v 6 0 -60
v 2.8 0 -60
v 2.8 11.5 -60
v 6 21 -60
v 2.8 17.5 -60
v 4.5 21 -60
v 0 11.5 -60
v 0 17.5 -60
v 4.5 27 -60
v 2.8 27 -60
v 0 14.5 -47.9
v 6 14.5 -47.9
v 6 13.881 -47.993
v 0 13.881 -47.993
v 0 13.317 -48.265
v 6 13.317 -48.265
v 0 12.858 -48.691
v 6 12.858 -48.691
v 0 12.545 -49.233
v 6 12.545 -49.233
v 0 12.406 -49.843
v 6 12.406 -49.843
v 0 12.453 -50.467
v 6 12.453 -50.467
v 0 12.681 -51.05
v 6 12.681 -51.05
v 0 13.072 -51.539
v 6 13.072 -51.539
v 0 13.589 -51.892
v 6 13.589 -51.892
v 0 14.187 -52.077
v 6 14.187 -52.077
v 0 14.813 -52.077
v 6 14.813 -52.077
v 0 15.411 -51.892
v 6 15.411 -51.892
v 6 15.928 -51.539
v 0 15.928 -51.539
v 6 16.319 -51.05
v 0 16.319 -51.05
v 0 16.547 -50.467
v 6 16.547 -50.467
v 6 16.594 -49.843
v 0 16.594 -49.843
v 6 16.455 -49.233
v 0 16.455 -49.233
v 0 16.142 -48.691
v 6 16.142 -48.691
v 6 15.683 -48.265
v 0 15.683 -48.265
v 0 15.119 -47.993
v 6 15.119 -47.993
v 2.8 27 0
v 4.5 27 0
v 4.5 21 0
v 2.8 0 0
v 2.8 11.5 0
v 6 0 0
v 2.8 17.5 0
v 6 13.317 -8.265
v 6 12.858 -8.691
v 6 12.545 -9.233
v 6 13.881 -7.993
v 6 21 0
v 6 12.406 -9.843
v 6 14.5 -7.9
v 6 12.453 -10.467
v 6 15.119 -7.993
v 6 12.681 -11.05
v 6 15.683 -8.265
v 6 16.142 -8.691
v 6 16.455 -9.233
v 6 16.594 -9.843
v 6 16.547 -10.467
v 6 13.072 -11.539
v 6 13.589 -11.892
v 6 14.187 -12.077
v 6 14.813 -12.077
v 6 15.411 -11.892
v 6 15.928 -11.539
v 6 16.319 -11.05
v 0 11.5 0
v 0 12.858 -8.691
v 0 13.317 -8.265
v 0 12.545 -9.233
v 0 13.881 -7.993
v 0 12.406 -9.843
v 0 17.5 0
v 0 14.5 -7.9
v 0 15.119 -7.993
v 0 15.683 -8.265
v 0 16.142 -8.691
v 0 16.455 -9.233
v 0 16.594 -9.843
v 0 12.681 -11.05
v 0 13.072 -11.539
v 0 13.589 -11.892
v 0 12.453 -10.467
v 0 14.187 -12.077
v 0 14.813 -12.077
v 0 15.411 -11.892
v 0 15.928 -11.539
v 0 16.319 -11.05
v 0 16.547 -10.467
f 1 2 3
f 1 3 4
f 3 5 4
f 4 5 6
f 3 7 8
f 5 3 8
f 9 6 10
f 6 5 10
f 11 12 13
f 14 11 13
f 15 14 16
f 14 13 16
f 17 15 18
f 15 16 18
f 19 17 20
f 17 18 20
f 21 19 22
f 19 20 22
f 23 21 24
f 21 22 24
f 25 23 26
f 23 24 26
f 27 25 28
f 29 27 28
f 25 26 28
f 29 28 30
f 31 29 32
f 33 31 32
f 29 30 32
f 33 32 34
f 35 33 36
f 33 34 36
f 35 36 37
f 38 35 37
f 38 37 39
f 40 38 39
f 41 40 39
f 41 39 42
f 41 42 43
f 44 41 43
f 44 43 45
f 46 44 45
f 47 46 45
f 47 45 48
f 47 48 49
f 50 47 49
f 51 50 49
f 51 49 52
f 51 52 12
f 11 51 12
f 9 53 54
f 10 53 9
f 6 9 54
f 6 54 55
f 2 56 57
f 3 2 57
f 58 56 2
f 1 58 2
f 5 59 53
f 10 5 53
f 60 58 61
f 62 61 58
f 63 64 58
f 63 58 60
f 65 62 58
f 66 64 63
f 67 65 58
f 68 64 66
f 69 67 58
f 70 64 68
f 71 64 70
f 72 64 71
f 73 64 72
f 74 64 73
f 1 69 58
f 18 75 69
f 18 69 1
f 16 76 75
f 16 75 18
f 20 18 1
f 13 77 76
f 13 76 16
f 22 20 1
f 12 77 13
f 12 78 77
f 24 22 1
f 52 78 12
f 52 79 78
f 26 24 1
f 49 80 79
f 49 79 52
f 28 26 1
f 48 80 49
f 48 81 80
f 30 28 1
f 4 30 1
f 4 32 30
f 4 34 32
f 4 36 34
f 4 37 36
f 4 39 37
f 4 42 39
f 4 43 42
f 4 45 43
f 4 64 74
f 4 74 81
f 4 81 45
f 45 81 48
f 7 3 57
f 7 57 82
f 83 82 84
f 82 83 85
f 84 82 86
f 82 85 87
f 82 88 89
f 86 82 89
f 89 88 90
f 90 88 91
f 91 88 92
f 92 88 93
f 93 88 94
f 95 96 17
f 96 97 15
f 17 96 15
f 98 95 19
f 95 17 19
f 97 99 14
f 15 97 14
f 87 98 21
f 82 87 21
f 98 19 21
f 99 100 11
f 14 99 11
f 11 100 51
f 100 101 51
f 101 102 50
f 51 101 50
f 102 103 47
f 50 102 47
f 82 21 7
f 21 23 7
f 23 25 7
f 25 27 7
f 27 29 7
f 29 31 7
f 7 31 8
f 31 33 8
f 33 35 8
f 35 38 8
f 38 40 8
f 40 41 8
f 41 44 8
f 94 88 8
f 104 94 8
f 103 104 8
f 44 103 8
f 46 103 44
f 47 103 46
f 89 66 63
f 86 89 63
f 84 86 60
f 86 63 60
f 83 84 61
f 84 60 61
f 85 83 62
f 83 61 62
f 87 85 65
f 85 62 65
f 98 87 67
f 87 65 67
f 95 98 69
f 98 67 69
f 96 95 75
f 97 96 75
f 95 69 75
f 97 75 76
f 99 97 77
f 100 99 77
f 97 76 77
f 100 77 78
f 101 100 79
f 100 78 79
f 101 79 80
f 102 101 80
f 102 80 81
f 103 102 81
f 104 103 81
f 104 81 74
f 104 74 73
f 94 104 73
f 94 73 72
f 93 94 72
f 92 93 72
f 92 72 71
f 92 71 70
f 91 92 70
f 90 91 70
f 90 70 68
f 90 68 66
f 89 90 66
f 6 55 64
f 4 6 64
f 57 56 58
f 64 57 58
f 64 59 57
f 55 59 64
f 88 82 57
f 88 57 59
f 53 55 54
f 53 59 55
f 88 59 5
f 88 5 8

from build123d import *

# Parameters (mm, degrees)
SKETCH1_W                = 60
SKETCH1_H                = 27
BOSS_EXTRUDE1_DEPTH      = 6
CUT_EXTRUDE19_DEPTH      = 67.068146637
CUT_EXTRUDE19_DEPTH_BACK = 67.068146637
SKETCH9_W                = 2.8
SKETCH9_H                = 11.5
CUT_EXTRUDE20_DEPTH      = 67.068146637
CUT_EXTRUDE21_DEPTH      = 67.068146637
CUT_EXTRUDE21_DEPTH_BACK = 67.068146637
SKETCH10_W               = 2.8
SKETCH10_H               = 9.5
M5_TAPPED_HOLE3_D        = 4.2
M5_TAPPED_HOLE3_DEPTH    = 12.4
M5_TAPPED_HOLE3_TIP      = 1.2618073
M5_TAPPED_HOLE4_D        = 4.2
M5_TAPPED_HOLE4_DEPTH    = 12.4
M5_TAPPED_HOLE4_TIP      = 1.2618073


with BuildPart() as part:
    # Sketch1 → Boss-Extrude1 (new body)
    with BuildSketch(Plane(origin=(0, 0, 0), x_dir=(0, 0, -1), z_dir=(1, 0, 0))):
        with Locations((30, 13.5)):
            Rectangle(SKETCH1_W, SKETCH1_H)
    extrude(amount=BOSS_EXTRUDE1_DEPTH)

    # 3DSketch1 → Cut-Extrude19 (cut, two sides: drawn at the far end of the back side and taken through both)
    with BuildSketch(Plane(origin=(6, 27, 0), x_dir=(-0.24253562503633286, -0.970142500145332, 0), z_dir=(0, 0, -1)).offset(-CUT_EXTRUDE19_DEPTH_BACK)):
        Polygon((0, 0), (0.363803438, 1.45521375), (6.184658438, 0), (5.820855001, -1.45521375), align=None)
    extrude(amount=CUT_EXTRUDE19_DEPTH + CUT_EXTRUDE19_DEPTH_BACK, mode=Mode.SUBTRACT)

    # Sketch9 → Cut-Extrude20 (cut, through all)
    with BuildSketch(Plane(origin=(0, 0, -60), x_dir=(-1, 0, 0), z_dir=(0, 0, -1))):
        with Locations((-1.4, 5.75)):
            Rectangle(SKETCH9_W, SKETCH9_H)
    extrude(amount=-CUT_EXTRUDE20_DEPTH, mode=Mode.SUBTRACT)

    # Sketch10 → Cut-Extrude21 (cut, two sides: drawn at the far end of the back side and taken through both)
    with BuildSketch(Plane(origin=(0, 0, -60), x_dir=(-1, 0, 0), z_dir=(0, 0, -1)).offset(-CUT_EXTRUDE21_DEPTH_BACK)):
        with Locations((-1.4, 22.25)):
            Rectangle(SKETCH10_W, SKETCH10_H)
    extrude(amount=CUT_EXTRUDE21_DEPTH + CUT_EXTRUDE21_DEPTH_BACK, mode=Mode.SUBTRACT)

    # M5 Tapped Hole3
    with Locations(Plane(origin=(0, 14.5, -50), x_dir=(0, 0, -1), z_dir=(-1, 0, 0))):
        with Locations((0, 0)):
            Hole(M5_TAPPED_HOLE3_D / 2, depth=M5_TAPPED_HOLE3_DEPTH)
            with Locations((0, 0, -(M5_TAPPED_HOLE3_DEPTH + M5_TAPPED_HOLE3_TIP / 2))):  # 118° drill point
                Cone(0, M5_TAPPED_HOLE3_D / 2, M5_TAPPED_HOLE3_TIP, mode=Mode.SUBTRACT)

    # M5 Tapped Hole4
    with Locations(Plane(origin=(0, 14.5, -10), x_dir=(0, 0, -1), z_dir=(-1, 0, 0))):
        with Locations((0, 0)):
            Hole(M5_TAPPED_HOLE4_D / 2, depth=M5_TAPPED_HOLE4_DEPTH)
            with Locations((0, 0, -(M5_TAPPED_HOLE4_DEPTH + M5_TAPPED_HOLE4_TIP / 2))):  # 118° drill point
                Cone(0, M5_TAPPED_HOLE4_D / 2, M5_TAPPED_HOLE4_TIP, mode=Mode.SUBTRACT)


solid = part.part
